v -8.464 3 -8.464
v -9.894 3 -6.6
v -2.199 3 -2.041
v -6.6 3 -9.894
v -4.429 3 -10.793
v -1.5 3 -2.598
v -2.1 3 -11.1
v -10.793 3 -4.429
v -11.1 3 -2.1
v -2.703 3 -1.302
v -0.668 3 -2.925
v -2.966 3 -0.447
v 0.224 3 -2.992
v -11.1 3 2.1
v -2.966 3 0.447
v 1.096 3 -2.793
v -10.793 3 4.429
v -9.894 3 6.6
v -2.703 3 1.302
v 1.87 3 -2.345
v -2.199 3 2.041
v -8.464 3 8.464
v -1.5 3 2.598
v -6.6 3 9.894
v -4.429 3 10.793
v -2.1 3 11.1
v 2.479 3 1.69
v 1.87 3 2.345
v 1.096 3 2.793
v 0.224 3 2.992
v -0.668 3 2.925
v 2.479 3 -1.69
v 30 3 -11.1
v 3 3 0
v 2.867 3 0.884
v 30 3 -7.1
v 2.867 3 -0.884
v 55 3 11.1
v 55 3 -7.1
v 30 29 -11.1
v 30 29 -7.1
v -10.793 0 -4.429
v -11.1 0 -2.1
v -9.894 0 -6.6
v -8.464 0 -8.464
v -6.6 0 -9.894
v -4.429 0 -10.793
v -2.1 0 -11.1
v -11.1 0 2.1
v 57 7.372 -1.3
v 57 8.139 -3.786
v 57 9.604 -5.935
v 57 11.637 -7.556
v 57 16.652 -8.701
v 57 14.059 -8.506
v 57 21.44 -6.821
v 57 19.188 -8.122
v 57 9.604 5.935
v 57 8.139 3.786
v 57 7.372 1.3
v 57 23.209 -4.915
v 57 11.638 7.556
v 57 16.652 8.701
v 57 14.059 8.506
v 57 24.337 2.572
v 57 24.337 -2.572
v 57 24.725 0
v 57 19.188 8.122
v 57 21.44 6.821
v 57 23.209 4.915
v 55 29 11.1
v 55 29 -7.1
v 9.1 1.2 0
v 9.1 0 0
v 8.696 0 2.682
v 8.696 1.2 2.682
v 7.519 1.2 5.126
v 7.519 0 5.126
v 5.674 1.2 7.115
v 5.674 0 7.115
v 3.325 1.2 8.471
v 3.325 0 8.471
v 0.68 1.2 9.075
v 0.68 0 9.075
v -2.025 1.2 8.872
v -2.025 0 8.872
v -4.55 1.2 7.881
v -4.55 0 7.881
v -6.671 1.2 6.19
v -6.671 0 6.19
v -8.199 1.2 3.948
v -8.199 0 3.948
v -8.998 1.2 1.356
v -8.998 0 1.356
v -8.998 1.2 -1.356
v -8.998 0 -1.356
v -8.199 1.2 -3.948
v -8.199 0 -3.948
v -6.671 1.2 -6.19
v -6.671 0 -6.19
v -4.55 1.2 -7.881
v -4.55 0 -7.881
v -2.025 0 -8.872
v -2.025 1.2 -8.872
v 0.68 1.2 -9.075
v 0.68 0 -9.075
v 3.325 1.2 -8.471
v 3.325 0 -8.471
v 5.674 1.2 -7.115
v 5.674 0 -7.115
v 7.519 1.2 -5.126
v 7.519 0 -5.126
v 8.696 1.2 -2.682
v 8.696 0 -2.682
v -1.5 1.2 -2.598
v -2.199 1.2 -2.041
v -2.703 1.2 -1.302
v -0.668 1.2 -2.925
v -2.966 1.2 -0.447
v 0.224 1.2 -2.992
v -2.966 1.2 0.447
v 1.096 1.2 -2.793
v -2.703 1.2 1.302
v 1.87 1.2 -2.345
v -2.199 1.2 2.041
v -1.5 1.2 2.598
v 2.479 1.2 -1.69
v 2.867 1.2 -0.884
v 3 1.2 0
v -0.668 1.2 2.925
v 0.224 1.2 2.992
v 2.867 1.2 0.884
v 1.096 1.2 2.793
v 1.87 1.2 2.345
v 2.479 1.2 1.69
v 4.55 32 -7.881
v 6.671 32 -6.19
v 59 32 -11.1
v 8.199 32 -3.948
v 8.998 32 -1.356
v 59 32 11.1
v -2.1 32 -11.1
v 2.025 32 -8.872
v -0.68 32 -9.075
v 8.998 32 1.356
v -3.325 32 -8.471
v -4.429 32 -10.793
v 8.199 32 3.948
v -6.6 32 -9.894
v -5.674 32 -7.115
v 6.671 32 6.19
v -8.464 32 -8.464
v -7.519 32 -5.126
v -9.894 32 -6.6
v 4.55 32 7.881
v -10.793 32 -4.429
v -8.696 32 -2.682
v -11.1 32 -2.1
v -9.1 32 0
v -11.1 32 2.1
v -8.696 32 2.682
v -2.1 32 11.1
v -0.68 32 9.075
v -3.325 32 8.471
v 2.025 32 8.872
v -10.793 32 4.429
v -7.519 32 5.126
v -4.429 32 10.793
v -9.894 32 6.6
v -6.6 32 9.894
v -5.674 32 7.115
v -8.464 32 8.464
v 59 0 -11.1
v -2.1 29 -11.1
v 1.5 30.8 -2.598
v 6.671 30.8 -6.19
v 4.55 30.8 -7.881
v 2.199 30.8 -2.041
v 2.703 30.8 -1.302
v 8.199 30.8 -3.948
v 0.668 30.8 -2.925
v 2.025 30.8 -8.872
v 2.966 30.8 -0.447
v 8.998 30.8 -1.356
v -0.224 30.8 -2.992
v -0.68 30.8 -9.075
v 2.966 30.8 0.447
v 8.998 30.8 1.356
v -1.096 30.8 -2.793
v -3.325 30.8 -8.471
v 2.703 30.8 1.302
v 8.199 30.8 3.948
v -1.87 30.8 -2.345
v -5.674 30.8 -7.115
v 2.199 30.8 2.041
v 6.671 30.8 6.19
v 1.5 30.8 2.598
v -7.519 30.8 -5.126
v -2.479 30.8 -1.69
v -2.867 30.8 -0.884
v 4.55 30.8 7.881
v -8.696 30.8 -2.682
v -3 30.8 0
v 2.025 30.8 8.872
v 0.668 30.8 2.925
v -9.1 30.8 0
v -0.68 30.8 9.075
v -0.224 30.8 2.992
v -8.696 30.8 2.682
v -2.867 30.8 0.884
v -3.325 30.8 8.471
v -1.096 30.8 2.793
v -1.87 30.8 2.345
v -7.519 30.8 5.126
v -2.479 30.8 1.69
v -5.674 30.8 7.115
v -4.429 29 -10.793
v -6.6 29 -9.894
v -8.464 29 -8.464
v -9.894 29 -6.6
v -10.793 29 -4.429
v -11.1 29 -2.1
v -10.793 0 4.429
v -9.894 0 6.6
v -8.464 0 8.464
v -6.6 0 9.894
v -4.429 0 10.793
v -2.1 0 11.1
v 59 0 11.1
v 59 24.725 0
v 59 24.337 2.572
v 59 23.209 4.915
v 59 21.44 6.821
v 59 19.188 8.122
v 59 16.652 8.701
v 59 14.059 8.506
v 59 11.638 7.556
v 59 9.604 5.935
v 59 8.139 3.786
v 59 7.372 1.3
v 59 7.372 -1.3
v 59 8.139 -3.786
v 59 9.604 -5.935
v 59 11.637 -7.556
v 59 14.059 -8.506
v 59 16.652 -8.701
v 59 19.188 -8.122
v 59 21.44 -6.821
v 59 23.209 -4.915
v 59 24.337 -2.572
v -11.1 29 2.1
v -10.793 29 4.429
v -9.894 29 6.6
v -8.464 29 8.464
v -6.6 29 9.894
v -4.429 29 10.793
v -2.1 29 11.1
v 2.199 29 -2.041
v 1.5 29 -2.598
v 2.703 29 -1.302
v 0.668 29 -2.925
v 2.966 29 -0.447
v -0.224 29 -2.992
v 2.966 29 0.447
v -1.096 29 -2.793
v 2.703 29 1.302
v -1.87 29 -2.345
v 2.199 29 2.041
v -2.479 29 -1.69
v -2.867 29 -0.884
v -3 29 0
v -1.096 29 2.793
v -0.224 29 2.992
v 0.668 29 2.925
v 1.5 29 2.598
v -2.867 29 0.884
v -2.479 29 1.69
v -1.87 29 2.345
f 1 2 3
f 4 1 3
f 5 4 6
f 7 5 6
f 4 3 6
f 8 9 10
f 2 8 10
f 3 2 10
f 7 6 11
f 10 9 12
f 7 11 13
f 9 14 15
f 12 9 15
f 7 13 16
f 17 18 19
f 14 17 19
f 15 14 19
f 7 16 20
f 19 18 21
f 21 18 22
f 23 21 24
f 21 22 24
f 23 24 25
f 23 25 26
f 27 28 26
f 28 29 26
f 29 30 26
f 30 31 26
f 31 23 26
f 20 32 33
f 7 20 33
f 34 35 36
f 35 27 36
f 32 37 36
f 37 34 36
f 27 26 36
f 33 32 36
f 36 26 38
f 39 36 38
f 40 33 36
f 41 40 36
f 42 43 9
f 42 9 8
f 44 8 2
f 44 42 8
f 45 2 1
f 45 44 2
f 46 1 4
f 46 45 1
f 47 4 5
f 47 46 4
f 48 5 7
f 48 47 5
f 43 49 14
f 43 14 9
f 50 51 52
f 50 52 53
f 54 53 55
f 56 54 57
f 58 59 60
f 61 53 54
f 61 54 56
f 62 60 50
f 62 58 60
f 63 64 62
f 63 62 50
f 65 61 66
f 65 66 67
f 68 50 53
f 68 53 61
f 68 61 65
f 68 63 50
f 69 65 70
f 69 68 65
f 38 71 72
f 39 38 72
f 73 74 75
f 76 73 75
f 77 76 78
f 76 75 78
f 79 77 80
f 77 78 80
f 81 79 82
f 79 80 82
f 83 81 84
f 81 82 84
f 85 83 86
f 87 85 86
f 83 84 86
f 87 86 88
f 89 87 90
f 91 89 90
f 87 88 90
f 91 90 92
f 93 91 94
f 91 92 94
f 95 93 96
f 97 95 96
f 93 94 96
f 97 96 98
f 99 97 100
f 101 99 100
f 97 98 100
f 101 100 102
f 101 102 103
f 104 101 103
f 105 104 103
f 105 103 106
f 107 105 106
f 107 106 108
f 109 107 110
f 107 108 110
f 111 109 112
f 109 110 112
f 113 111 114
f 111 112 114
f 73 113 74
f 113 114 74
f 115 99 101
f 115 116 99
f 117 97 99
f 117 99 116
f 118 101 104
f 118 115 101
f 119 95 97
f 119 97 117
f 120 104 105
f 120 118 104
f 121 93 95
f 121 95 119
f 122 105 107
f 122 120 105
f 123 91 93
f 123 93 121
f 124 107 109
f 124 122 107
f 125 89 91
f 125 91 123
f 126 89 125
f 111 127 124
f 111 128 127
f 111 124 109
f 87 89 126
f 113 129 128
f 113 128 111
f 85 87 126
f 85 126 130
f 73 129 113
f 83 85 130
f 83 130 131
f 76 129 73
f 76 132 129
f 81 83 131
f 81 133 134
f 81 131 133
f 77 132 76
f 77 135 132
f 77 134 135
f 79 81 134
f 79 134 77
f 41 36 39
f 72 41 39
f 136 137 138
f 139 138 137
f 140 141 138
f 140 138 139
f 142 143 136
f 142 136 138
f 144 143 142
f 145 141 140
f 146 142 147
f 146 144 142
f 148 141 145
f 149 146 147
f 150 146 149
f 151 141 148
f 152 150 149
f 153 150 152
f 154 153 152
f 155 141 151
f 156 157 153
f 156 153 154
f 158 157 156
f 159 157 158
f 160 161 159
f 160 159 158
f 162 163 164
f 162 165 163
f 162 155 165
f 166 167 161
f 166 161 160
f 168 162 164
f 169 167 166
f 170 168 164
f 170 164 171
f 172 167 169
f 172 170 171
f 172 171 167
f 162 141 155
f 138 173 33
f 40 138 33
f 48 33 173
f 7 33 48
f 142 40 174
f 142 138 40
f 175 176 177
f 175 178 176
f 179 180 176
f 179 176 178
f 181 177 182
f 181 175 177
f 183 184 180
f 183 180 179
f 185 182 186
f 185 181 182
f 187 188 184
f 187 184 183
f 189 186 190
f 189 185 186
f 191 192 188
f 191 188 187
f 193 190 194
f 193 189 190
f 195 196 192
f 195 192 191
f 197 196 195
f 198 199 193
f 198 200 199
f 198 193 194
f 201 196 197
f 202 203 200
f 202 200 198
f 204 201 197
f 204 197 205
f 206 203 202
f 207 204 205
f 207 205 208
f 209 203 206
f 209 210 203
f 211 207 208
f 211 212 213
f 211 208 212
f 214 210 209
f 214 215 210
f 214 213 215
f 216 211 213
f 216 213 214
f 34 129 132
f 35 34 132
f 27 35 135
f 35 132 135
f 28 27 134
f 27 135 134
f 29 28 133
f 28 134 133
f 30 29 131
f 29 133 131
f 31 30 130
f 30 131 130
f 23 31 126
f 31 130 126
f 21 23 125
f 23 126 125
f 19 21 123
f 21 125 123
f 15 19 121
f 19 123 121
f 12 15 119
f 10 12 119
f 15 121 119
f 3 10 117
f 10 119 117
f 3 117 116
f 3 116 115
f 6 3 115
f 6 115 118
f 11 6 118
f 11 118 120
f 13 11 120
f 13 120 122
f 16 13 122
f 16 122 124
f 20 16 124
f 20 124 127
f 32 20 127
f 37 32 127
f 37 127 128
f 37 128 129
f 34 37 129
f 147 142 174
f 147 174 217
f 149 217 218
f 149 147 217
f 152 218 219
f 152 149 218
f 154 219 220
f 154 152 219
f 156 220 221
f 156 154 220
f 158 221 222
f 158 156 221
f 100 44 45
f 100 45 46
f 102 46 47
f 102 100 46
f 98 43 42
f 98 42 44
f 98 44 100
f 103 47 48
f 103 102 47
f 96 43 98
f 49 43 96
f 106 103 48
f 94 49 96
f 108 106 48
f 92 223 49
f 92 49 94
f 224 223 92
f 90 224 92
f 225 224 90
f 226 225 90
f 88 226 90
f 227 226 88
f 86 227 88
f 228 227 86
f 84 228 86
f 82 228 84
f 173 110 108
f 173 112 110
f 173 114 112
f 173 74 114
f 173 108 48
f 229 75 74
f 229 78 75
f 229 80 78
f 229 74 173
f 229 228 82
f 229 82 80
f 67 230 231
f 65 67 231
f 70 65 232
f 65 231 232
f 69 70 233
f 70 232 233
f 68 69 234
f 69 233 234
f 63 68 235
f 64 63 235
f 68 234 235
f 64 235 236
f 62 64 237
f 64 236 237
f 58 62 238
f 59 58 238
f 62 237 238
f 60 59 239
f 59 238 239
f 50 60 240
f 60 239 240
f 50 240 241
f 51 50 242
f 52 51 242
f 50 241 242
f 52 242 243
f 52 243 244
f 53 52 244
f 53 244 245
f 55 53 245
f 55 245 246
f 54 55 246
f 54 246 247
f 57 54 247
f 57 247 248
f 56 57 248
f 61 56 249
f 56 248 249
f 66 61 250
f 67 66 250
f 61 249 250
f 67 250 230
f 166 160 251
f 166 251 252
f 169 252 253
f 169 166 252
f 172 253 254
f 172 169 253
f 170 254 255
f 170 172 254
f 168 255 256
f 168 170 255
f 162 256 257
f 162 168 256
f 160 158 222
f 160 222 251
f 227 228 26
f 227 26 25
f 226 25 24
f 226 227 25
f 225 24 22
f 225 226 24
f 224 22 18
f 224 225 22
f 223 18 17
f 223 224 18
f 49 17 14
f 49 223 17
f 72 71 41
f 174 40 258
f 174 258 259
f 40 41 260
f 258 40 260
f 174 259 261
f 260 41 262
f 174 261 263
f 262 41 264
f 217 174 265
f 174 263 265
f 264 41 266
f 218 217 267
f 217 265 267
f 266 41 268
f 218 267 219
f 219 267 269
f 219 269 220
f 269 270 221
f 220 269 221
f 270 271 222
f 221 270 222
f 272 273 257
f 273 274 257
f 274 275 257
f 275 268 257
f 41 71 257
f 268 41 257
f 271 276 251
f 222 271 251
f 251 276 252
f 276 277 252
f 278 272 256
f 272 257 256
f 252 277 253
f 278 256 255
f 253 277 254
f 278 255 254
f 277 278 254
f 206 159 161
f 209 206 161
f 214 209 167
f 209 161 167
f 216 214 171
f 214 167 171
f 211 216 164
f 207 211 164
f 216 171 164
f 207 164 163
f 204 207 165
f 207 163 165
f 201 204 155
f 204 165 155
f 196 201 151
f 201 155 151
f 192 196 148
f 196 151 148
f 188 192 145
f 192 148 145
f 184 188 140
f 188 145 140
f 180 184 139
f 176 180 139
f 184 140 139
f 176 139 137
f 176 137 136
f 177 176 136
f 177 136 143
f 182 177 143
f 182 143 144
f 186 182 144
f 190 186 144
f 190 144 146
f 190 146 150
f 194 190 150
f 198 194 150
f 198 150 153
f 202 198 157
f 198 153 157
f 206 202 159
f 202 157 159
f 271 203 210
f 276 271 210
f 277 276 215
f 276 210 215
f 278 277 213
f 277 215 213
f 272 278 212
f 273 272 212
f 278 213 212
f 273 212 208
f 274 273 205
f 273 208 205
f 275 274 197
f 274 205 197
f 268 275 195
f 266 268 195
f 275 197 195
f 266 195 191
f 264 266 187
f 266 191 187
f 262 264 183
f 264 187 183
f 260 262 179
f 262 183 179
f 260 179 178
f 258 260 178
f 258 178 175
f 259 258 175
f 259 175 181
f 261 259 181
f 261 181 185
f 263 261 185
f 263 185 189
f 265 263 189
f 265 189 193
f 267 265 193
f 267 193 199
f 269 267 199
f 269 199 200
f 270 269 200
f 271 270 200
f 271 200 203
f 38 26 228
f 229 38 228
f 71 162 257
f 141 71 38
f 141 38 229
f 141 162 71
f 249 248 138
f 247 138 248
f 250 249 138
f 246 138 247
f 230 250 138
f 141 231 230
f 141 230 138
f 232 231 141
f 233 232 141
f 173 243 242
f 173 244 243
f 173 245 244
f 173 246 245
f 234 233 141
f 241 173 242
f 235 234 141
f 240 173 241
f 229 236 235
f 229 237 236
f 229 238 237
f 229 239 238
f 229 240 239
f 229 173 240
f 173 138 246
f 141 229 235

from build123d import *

# Parameters (mm, degrees)
F0_R     = 9.1
F0_R_2   = 3
F1_DEPTH = 3
F0_W     = 25
F0_H     = 4
F2_DEPTH = 32
F3_R     = 9.1
F3_R_2   = 3
F4_DEPTH = 3
F5_DEPTH = 1.2
F6_R     = 8.725
F7_DEPTH = 2
F8_DEPTH = 1.2


# Not quite as in the source:
# - a feature names something its author has since deleted; it is built from what else it names


with BuildPart() as f1:
    # F0 (on Front) → F1 (new body)
    with BuildSketch(Plane.XZ):
        with BuildLine():
            Line((55, 11.1), (-2.1, 11.1))
            ThreePointArc((-2.1, 11.1), (-8.4639610307, 8.4639610307), (-11.1, 2.1))
            Line((-11.1, 2.1), (-11.1, -2.1))
            ThreePointArc((-11.1, -2.1), (-8.4639610307, -8.4639610307), (-2.1, -11.1))
            Line((-2.1, -11.1), (30, -11.1))
            Line((30, -11.1), (30, -7.1))
            Line((30, -7.1), (55, -7.1))
            Line((55, -7.1), (55, 11.1))
        make_face()
        Circle(F0_R, mode=Mode.SUBTRACT)
        Circle(F0_R)
        Circle(F0_R_2, mode=Mode.SUBTRACT)
    extrude(amount=-F1_DEPTH)

    # F0 (on Front) → F2 (join)
    with BuildSketch(Plane.XZ):
        Polygon((59, 11.1), (55, 11.1), (55, -7.1), (55, -11.1), (59, -11.1), align=None)
        with Locations((42.5, -9.1)):
            Rectangle(F0_W, F0_H)
    extrude(amount=-F2_DEPTH)

    # F3 (on face) → F4 (join)
    with BuildSketch(Plane(origin=(0, 32, 0), x_dir=(-1, 0, 0), z_dir=(0, 1, 0))):
        with BuildLine():
            Line((-30, -7.1), (-30, -11.1))
            Line((-30, -11.1), (2.1, -11.1))
            ThreePointArc((2.1, -11.1), (8.4639610307, -8.4639610307), (11.1, -2.1))
            Line((11.1, -2.1), (11.1, 2.1))
            ThreePointArc((11.1, 2.1), (8.4639610307, 8.4639610307), (2.1, 11.1))
            Line((2.1, 11.1), (-55, 11.1))
            Line((-55, 11.1), (-55, -7.1))
            Line((-55, -7.1), (-30, -7.1))
        make_face()
        Circle(F3_R, mode=Mode.SUBTRACT)
        Circle(F3_R)
        Circle(F3_R_2, mode=Mode.SUBTRACT)
    extrude(amount=-F4_DEPTH)

    # F0 (on Front) → F5 (cut)
    with BuildSketch(Plane.XZ):
        Circle(F0_R)
        Circle(F0_R_2, mode=Mode.SUBTRACT)
    extrude(amount=-F5_DEPTH, mode=Mode.SUBTRACT)

    # F6 (on face) → F7 (cut)
    with BuildSketch(Plane.YZ.offset(59)):
        with Locations((16, 0)):
            Circle(F6_R)
    extrude(amount=-F7_DEPTH, mode=Mode.SUBTRACT)

    # F3 (on face) → F8 (cut)
    with BuildSketch(Plane(origin=(0, 32, 0), x_dir=(-1, 0, 0), z_dir=(0, 1, 0))):
        Circle(F3_R)
        Circle(F3_R_2, mode=Mode.SUBTRACT)
    extrude(amount=-F8_DEPTH, mode=Mode.SUBTRACT)


solid = f1.part
